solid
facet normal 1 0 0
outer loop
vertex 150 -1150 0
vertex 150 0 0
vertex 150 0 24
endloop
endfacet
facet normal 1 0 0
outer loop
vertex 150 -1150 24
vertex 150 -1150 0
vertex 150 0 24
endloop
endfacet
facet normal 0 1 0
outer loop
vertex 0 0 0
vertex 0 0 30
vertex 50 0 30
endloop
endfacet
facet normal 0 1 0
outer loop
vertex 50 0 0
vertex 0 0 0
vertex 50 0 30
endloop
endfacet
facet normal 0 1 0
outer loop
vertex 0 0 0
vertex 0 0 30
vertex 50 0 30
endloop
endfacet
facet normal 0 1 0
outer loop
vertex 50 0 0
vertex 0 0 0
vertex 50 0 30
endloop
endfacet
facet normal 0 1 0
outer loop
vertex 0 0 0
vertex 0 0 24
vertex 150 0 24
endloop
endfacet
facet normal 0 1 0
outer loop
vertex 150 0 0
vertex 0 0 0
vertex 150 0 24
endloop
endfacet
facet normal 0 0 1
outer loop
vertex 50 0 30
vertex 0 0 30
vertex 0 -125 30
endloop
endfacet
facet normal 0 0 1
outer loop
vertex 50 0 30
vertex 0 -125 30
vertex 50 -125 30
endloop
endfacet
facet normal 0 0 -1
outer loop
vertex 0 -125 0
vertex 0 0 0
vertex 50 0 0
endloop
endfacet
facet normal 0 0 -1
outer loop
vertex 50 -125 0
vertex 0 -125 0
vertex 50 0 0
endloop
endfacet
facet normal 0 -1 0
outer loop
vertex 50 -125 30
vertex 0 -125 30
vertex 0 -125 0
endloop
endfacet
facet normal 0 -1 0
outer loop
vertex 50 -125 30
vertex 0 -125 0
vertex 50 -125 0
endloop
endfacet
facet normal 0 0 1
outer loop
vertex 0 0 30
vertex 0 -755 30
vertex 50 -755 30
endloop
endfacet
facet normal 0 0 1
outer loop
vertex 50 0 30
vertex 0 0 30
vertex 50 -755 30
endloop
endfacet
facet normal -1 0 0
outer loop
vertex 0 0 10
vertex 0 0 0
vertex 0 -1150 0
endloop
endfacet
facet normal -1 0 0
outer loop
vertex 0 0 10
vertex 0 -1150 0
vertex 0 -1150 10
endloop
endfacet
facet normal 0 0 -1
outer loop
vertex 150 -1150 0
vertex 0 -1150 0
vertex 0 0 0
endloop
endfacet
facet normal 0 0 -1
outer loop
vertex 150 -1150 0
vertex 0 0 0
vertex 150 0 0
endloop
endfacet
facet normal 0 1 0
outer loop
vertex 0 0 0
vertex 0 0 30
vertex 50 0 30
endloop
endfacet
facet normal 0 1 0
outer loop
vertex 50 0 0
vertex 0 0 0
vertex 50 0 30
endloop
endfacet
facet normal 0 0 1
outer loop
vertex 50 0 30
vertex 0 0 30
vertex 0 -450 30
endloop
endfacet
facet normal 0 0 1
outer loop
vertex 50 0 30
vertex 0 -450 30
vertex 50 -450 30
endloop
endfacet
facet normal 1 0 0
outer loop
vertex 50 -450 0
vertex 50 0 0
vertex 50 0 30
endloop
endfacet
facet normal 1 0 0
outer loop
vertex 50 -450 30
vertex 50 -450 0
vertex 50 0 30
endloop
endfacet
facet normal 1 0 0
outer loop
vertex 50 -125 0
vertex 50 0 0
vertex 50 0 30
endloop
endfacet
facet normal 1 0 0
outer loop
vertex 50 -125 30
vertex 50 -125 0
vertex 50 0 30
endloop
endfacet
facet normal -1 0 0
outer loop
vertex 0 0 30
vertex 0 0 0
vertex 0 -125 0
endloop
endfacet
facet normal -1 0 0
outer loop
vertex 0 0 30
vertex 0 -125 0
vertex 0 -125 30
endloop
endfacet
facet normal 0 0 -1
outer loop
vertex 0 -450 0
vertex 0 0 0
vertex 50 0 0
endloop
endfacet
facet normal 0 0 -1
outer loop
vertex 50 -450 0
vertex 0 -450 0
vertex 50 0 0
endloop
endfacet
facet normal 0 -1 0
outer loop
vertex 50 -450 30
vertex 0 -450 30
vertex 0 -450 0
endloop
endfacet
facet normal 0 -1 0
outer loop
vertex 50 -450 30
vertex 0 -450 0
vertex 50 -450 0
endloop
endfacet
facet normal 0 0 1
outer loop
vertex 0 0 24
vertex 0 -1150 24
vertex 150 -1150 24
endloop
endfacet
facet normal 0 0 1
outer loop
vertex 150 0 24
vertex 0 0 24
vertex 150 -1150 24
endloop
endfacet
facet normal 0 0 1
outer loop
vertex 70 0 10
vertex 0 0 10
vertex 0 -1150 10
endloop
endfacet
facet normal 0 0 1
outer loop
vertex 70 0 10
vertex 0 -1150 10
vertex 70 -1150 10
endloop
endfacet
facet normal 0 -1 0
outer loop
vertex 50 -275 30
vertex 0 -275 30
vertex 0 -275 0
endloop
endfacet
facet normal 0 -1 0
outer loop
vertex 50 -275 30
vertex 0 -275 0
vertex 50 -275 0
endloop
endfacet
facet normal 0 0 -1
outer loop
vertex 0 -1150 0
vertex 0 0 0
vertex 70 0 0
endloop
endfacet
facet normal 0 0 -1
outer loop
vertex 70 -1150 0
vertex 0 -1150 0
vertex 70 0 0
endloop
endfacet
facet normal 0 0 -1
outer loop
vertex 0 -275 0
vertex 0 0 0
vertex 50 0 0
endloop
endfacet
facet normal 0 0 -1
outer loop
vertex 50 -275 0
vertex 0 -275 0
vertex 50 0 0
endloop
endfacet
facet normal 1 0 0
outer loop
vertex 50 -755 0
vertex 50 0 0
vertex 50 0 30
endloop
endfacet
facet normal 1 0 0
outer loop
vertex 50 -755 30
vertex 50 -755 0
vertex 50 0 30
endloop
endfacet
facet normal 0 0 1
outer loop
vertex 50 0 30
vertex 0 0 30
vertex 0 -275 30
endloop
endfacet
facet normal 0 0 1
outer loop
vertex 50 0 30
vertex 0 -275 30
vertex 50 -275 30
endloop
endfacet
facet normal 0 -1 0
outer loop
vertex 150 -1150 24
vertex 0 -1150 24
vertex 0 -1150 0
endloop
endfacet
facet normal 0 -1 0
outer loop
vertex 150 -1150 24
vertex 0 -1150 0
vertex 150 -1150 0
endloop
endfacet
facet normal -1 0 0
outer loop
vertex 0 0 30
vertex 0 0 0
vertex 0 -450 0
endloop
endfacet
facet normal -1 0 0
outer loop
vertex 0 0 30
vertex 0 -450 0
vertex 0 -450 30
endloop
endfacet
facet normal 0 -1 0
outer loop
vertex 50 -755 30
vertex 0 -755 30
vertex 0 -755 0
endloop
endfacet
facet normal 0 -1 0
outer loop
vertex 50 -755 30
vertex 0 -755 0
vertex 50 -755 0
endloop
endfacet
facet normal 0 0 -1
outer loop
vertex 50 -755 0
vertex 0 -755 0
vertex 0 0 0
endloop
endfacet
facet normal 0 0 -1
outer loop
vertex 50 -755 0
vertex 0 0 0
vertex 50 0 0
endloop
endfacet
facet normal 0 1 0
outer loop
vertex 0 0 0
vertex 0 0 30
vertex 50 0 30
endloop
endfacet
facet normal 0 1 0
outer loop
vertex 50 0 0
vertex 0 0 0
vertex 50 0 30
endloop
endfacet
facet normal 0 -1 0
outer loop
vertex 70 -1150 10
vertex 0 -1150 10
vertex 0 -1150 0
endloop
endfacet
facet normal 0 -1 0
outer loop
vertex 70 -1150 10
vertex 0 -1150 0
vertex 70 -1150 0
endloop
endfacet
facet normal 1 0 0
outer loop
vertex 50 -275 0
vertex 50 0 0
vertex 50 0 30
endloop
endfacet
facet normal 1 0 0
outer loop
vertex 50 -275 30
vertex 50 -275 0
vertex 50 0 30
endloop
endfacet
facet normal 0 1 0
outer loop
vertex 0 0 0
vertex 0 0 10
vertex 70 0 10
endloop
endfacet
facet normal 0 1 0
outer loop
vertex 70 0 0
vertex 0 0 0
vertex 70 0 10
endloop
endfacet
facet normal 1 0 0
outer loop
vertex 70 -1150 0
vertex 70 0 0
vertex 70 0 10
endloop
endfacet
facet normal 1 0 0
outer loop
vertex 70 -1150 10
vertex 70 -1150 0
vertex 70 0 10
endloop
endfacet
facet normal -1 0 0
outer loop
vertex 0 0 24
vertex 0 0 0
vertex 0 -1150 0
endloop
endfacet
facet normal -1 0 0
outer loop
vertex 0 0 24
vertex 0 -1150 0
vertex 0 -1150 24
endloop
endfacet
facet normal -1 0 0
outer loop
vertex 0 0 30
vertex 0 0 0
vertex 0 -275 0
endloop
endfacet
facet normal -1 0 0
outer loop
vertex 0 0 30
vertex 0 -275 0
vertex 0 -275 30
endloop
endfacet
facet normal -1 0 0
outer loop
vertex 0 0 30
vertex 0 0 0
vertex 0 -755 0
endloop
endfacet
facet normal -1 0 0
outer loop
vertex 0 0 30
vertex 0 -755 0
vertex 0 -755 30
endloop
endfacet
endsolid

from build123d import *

# Parameters (mm, degrees)
F0_W     = 150
F0_H     = 24
F1_DEPTH = 1150
F3_W     = 50
F3_H     = 30
F4_DEPTH = 450
F5_DEPTH = 755
F6_DEPTH = 275
F7_DEPTH = 125
F2_W     = 70
F2_H     = 10
F8_DEPTH = 1150


with BuildPart() as f1:
    # F0 (on Front) → F1 (new body)
    with BuildSketch(Plane.XZ):
        with Locations((75, 12)):
            Rectangle(F0_W, F0_H)
    extrude(amount=F1_DEPTH)


with BuildPart() as f4:
    # F3 (on Front) → F4 (new body)
    with BuildSketch(Plane.XZ):
        with Locations((25, 15)):
            Rectangle(F3_W, F3_H)
    extrude(amount=F4_DEPTH)


with BuildPart() as f5:
    # F3 (on Front) → F5 (new body)
    with BuildSketch(Plane.XZ):
        with Locations((25, 15)):
            Rectangle(F3_W, F3_H)
    extrude(amount=F5_DEPTH)


with BuildPart() as f6:
    # F3 (on Front) → F6 (new body)
    with BuildSketch(Plane.XZ):
        with Locations((25, 15)):
            Rectangle(F3_W, F3_H)
    extrude(amount=F6_DEPTH)


with BuildPart() as f7:
    # F3 (on Front) → F7 (new body)
    with BuildSketch(Plane.XZ):
        with Locations((25, 15)):
            Rectangle(F3_W, F3_H)
    extrude(amount=F7_DEPTH)


with BuildPart() as f8:
    # F2 (on Front) → F8 (new body)
    with BuildSketch(Plane.XZ):
        with Locations((35, 5)):
            Rectangle(F2_W, F2_H)
    extrude(amount=F8_DEPTH)


solid = Compound([f1.part, f4.part, f5.part, f6.part, f7.part, f8.part])
